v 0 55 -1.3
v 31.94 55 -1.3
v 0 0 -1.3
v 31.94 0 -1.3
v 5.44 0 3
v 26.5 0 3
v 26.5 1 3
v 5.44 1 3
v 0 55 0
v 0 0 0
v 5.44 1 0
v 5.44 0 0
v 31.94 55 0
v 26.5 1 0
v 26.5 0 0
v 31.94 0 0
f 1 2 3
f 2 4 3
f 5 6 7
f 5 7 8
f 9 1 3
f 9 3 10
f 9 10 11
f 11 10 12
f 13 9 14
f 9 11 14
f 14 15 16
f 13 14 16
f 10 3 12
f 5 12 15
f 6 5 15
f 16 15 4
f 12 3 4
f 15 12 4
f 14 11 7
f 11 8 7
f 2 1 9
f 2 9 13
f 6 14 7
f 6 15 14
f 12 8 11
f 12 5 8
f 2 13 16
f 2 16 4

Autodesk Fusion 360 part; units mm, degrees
sketch "Sketch1" plane through (0, 0, 0) normal (0, 1, 0) x (1, 0, 0)
  line L0 (0, 0) -> (31.94, 0)
  line L1 (31.94, 0) -> (31.94, 1.3)
  line L2 (31.94, 1.3) -> (0, 1.3)
  line L3 (0, 1.3) -> (0, 0)
  dimension "d13" = 1.3
extrude "Extrude1" add sketch "Sketch1" along normal blind 55
sketch "Sketch3" plane through (0, 0, 0) normal (0, -1, 0) x (1, 0, 0)
  line L0 (0, 0) -> (0, -1.3)
  line L1 (0, -1.3) -> (31.94, -1.3)
  line L2 (31.94, -1.3) -> (31.94, 0)
  line L3 (31.94, 0) -> (0, 0)
  line L4 (5.44, 0) -> (26.5, 0)
  line L5 (26.5, 0) -> (26.5, 3)
  line L6 (26.5, 3) -> (5.44, 3)
  line L7 (5.44, 3) -> (5.44, 0)
extrude "Extrude2" add sketch "Sketch3" against normal blind 1 contours L3 L4 L5 L6 L7
